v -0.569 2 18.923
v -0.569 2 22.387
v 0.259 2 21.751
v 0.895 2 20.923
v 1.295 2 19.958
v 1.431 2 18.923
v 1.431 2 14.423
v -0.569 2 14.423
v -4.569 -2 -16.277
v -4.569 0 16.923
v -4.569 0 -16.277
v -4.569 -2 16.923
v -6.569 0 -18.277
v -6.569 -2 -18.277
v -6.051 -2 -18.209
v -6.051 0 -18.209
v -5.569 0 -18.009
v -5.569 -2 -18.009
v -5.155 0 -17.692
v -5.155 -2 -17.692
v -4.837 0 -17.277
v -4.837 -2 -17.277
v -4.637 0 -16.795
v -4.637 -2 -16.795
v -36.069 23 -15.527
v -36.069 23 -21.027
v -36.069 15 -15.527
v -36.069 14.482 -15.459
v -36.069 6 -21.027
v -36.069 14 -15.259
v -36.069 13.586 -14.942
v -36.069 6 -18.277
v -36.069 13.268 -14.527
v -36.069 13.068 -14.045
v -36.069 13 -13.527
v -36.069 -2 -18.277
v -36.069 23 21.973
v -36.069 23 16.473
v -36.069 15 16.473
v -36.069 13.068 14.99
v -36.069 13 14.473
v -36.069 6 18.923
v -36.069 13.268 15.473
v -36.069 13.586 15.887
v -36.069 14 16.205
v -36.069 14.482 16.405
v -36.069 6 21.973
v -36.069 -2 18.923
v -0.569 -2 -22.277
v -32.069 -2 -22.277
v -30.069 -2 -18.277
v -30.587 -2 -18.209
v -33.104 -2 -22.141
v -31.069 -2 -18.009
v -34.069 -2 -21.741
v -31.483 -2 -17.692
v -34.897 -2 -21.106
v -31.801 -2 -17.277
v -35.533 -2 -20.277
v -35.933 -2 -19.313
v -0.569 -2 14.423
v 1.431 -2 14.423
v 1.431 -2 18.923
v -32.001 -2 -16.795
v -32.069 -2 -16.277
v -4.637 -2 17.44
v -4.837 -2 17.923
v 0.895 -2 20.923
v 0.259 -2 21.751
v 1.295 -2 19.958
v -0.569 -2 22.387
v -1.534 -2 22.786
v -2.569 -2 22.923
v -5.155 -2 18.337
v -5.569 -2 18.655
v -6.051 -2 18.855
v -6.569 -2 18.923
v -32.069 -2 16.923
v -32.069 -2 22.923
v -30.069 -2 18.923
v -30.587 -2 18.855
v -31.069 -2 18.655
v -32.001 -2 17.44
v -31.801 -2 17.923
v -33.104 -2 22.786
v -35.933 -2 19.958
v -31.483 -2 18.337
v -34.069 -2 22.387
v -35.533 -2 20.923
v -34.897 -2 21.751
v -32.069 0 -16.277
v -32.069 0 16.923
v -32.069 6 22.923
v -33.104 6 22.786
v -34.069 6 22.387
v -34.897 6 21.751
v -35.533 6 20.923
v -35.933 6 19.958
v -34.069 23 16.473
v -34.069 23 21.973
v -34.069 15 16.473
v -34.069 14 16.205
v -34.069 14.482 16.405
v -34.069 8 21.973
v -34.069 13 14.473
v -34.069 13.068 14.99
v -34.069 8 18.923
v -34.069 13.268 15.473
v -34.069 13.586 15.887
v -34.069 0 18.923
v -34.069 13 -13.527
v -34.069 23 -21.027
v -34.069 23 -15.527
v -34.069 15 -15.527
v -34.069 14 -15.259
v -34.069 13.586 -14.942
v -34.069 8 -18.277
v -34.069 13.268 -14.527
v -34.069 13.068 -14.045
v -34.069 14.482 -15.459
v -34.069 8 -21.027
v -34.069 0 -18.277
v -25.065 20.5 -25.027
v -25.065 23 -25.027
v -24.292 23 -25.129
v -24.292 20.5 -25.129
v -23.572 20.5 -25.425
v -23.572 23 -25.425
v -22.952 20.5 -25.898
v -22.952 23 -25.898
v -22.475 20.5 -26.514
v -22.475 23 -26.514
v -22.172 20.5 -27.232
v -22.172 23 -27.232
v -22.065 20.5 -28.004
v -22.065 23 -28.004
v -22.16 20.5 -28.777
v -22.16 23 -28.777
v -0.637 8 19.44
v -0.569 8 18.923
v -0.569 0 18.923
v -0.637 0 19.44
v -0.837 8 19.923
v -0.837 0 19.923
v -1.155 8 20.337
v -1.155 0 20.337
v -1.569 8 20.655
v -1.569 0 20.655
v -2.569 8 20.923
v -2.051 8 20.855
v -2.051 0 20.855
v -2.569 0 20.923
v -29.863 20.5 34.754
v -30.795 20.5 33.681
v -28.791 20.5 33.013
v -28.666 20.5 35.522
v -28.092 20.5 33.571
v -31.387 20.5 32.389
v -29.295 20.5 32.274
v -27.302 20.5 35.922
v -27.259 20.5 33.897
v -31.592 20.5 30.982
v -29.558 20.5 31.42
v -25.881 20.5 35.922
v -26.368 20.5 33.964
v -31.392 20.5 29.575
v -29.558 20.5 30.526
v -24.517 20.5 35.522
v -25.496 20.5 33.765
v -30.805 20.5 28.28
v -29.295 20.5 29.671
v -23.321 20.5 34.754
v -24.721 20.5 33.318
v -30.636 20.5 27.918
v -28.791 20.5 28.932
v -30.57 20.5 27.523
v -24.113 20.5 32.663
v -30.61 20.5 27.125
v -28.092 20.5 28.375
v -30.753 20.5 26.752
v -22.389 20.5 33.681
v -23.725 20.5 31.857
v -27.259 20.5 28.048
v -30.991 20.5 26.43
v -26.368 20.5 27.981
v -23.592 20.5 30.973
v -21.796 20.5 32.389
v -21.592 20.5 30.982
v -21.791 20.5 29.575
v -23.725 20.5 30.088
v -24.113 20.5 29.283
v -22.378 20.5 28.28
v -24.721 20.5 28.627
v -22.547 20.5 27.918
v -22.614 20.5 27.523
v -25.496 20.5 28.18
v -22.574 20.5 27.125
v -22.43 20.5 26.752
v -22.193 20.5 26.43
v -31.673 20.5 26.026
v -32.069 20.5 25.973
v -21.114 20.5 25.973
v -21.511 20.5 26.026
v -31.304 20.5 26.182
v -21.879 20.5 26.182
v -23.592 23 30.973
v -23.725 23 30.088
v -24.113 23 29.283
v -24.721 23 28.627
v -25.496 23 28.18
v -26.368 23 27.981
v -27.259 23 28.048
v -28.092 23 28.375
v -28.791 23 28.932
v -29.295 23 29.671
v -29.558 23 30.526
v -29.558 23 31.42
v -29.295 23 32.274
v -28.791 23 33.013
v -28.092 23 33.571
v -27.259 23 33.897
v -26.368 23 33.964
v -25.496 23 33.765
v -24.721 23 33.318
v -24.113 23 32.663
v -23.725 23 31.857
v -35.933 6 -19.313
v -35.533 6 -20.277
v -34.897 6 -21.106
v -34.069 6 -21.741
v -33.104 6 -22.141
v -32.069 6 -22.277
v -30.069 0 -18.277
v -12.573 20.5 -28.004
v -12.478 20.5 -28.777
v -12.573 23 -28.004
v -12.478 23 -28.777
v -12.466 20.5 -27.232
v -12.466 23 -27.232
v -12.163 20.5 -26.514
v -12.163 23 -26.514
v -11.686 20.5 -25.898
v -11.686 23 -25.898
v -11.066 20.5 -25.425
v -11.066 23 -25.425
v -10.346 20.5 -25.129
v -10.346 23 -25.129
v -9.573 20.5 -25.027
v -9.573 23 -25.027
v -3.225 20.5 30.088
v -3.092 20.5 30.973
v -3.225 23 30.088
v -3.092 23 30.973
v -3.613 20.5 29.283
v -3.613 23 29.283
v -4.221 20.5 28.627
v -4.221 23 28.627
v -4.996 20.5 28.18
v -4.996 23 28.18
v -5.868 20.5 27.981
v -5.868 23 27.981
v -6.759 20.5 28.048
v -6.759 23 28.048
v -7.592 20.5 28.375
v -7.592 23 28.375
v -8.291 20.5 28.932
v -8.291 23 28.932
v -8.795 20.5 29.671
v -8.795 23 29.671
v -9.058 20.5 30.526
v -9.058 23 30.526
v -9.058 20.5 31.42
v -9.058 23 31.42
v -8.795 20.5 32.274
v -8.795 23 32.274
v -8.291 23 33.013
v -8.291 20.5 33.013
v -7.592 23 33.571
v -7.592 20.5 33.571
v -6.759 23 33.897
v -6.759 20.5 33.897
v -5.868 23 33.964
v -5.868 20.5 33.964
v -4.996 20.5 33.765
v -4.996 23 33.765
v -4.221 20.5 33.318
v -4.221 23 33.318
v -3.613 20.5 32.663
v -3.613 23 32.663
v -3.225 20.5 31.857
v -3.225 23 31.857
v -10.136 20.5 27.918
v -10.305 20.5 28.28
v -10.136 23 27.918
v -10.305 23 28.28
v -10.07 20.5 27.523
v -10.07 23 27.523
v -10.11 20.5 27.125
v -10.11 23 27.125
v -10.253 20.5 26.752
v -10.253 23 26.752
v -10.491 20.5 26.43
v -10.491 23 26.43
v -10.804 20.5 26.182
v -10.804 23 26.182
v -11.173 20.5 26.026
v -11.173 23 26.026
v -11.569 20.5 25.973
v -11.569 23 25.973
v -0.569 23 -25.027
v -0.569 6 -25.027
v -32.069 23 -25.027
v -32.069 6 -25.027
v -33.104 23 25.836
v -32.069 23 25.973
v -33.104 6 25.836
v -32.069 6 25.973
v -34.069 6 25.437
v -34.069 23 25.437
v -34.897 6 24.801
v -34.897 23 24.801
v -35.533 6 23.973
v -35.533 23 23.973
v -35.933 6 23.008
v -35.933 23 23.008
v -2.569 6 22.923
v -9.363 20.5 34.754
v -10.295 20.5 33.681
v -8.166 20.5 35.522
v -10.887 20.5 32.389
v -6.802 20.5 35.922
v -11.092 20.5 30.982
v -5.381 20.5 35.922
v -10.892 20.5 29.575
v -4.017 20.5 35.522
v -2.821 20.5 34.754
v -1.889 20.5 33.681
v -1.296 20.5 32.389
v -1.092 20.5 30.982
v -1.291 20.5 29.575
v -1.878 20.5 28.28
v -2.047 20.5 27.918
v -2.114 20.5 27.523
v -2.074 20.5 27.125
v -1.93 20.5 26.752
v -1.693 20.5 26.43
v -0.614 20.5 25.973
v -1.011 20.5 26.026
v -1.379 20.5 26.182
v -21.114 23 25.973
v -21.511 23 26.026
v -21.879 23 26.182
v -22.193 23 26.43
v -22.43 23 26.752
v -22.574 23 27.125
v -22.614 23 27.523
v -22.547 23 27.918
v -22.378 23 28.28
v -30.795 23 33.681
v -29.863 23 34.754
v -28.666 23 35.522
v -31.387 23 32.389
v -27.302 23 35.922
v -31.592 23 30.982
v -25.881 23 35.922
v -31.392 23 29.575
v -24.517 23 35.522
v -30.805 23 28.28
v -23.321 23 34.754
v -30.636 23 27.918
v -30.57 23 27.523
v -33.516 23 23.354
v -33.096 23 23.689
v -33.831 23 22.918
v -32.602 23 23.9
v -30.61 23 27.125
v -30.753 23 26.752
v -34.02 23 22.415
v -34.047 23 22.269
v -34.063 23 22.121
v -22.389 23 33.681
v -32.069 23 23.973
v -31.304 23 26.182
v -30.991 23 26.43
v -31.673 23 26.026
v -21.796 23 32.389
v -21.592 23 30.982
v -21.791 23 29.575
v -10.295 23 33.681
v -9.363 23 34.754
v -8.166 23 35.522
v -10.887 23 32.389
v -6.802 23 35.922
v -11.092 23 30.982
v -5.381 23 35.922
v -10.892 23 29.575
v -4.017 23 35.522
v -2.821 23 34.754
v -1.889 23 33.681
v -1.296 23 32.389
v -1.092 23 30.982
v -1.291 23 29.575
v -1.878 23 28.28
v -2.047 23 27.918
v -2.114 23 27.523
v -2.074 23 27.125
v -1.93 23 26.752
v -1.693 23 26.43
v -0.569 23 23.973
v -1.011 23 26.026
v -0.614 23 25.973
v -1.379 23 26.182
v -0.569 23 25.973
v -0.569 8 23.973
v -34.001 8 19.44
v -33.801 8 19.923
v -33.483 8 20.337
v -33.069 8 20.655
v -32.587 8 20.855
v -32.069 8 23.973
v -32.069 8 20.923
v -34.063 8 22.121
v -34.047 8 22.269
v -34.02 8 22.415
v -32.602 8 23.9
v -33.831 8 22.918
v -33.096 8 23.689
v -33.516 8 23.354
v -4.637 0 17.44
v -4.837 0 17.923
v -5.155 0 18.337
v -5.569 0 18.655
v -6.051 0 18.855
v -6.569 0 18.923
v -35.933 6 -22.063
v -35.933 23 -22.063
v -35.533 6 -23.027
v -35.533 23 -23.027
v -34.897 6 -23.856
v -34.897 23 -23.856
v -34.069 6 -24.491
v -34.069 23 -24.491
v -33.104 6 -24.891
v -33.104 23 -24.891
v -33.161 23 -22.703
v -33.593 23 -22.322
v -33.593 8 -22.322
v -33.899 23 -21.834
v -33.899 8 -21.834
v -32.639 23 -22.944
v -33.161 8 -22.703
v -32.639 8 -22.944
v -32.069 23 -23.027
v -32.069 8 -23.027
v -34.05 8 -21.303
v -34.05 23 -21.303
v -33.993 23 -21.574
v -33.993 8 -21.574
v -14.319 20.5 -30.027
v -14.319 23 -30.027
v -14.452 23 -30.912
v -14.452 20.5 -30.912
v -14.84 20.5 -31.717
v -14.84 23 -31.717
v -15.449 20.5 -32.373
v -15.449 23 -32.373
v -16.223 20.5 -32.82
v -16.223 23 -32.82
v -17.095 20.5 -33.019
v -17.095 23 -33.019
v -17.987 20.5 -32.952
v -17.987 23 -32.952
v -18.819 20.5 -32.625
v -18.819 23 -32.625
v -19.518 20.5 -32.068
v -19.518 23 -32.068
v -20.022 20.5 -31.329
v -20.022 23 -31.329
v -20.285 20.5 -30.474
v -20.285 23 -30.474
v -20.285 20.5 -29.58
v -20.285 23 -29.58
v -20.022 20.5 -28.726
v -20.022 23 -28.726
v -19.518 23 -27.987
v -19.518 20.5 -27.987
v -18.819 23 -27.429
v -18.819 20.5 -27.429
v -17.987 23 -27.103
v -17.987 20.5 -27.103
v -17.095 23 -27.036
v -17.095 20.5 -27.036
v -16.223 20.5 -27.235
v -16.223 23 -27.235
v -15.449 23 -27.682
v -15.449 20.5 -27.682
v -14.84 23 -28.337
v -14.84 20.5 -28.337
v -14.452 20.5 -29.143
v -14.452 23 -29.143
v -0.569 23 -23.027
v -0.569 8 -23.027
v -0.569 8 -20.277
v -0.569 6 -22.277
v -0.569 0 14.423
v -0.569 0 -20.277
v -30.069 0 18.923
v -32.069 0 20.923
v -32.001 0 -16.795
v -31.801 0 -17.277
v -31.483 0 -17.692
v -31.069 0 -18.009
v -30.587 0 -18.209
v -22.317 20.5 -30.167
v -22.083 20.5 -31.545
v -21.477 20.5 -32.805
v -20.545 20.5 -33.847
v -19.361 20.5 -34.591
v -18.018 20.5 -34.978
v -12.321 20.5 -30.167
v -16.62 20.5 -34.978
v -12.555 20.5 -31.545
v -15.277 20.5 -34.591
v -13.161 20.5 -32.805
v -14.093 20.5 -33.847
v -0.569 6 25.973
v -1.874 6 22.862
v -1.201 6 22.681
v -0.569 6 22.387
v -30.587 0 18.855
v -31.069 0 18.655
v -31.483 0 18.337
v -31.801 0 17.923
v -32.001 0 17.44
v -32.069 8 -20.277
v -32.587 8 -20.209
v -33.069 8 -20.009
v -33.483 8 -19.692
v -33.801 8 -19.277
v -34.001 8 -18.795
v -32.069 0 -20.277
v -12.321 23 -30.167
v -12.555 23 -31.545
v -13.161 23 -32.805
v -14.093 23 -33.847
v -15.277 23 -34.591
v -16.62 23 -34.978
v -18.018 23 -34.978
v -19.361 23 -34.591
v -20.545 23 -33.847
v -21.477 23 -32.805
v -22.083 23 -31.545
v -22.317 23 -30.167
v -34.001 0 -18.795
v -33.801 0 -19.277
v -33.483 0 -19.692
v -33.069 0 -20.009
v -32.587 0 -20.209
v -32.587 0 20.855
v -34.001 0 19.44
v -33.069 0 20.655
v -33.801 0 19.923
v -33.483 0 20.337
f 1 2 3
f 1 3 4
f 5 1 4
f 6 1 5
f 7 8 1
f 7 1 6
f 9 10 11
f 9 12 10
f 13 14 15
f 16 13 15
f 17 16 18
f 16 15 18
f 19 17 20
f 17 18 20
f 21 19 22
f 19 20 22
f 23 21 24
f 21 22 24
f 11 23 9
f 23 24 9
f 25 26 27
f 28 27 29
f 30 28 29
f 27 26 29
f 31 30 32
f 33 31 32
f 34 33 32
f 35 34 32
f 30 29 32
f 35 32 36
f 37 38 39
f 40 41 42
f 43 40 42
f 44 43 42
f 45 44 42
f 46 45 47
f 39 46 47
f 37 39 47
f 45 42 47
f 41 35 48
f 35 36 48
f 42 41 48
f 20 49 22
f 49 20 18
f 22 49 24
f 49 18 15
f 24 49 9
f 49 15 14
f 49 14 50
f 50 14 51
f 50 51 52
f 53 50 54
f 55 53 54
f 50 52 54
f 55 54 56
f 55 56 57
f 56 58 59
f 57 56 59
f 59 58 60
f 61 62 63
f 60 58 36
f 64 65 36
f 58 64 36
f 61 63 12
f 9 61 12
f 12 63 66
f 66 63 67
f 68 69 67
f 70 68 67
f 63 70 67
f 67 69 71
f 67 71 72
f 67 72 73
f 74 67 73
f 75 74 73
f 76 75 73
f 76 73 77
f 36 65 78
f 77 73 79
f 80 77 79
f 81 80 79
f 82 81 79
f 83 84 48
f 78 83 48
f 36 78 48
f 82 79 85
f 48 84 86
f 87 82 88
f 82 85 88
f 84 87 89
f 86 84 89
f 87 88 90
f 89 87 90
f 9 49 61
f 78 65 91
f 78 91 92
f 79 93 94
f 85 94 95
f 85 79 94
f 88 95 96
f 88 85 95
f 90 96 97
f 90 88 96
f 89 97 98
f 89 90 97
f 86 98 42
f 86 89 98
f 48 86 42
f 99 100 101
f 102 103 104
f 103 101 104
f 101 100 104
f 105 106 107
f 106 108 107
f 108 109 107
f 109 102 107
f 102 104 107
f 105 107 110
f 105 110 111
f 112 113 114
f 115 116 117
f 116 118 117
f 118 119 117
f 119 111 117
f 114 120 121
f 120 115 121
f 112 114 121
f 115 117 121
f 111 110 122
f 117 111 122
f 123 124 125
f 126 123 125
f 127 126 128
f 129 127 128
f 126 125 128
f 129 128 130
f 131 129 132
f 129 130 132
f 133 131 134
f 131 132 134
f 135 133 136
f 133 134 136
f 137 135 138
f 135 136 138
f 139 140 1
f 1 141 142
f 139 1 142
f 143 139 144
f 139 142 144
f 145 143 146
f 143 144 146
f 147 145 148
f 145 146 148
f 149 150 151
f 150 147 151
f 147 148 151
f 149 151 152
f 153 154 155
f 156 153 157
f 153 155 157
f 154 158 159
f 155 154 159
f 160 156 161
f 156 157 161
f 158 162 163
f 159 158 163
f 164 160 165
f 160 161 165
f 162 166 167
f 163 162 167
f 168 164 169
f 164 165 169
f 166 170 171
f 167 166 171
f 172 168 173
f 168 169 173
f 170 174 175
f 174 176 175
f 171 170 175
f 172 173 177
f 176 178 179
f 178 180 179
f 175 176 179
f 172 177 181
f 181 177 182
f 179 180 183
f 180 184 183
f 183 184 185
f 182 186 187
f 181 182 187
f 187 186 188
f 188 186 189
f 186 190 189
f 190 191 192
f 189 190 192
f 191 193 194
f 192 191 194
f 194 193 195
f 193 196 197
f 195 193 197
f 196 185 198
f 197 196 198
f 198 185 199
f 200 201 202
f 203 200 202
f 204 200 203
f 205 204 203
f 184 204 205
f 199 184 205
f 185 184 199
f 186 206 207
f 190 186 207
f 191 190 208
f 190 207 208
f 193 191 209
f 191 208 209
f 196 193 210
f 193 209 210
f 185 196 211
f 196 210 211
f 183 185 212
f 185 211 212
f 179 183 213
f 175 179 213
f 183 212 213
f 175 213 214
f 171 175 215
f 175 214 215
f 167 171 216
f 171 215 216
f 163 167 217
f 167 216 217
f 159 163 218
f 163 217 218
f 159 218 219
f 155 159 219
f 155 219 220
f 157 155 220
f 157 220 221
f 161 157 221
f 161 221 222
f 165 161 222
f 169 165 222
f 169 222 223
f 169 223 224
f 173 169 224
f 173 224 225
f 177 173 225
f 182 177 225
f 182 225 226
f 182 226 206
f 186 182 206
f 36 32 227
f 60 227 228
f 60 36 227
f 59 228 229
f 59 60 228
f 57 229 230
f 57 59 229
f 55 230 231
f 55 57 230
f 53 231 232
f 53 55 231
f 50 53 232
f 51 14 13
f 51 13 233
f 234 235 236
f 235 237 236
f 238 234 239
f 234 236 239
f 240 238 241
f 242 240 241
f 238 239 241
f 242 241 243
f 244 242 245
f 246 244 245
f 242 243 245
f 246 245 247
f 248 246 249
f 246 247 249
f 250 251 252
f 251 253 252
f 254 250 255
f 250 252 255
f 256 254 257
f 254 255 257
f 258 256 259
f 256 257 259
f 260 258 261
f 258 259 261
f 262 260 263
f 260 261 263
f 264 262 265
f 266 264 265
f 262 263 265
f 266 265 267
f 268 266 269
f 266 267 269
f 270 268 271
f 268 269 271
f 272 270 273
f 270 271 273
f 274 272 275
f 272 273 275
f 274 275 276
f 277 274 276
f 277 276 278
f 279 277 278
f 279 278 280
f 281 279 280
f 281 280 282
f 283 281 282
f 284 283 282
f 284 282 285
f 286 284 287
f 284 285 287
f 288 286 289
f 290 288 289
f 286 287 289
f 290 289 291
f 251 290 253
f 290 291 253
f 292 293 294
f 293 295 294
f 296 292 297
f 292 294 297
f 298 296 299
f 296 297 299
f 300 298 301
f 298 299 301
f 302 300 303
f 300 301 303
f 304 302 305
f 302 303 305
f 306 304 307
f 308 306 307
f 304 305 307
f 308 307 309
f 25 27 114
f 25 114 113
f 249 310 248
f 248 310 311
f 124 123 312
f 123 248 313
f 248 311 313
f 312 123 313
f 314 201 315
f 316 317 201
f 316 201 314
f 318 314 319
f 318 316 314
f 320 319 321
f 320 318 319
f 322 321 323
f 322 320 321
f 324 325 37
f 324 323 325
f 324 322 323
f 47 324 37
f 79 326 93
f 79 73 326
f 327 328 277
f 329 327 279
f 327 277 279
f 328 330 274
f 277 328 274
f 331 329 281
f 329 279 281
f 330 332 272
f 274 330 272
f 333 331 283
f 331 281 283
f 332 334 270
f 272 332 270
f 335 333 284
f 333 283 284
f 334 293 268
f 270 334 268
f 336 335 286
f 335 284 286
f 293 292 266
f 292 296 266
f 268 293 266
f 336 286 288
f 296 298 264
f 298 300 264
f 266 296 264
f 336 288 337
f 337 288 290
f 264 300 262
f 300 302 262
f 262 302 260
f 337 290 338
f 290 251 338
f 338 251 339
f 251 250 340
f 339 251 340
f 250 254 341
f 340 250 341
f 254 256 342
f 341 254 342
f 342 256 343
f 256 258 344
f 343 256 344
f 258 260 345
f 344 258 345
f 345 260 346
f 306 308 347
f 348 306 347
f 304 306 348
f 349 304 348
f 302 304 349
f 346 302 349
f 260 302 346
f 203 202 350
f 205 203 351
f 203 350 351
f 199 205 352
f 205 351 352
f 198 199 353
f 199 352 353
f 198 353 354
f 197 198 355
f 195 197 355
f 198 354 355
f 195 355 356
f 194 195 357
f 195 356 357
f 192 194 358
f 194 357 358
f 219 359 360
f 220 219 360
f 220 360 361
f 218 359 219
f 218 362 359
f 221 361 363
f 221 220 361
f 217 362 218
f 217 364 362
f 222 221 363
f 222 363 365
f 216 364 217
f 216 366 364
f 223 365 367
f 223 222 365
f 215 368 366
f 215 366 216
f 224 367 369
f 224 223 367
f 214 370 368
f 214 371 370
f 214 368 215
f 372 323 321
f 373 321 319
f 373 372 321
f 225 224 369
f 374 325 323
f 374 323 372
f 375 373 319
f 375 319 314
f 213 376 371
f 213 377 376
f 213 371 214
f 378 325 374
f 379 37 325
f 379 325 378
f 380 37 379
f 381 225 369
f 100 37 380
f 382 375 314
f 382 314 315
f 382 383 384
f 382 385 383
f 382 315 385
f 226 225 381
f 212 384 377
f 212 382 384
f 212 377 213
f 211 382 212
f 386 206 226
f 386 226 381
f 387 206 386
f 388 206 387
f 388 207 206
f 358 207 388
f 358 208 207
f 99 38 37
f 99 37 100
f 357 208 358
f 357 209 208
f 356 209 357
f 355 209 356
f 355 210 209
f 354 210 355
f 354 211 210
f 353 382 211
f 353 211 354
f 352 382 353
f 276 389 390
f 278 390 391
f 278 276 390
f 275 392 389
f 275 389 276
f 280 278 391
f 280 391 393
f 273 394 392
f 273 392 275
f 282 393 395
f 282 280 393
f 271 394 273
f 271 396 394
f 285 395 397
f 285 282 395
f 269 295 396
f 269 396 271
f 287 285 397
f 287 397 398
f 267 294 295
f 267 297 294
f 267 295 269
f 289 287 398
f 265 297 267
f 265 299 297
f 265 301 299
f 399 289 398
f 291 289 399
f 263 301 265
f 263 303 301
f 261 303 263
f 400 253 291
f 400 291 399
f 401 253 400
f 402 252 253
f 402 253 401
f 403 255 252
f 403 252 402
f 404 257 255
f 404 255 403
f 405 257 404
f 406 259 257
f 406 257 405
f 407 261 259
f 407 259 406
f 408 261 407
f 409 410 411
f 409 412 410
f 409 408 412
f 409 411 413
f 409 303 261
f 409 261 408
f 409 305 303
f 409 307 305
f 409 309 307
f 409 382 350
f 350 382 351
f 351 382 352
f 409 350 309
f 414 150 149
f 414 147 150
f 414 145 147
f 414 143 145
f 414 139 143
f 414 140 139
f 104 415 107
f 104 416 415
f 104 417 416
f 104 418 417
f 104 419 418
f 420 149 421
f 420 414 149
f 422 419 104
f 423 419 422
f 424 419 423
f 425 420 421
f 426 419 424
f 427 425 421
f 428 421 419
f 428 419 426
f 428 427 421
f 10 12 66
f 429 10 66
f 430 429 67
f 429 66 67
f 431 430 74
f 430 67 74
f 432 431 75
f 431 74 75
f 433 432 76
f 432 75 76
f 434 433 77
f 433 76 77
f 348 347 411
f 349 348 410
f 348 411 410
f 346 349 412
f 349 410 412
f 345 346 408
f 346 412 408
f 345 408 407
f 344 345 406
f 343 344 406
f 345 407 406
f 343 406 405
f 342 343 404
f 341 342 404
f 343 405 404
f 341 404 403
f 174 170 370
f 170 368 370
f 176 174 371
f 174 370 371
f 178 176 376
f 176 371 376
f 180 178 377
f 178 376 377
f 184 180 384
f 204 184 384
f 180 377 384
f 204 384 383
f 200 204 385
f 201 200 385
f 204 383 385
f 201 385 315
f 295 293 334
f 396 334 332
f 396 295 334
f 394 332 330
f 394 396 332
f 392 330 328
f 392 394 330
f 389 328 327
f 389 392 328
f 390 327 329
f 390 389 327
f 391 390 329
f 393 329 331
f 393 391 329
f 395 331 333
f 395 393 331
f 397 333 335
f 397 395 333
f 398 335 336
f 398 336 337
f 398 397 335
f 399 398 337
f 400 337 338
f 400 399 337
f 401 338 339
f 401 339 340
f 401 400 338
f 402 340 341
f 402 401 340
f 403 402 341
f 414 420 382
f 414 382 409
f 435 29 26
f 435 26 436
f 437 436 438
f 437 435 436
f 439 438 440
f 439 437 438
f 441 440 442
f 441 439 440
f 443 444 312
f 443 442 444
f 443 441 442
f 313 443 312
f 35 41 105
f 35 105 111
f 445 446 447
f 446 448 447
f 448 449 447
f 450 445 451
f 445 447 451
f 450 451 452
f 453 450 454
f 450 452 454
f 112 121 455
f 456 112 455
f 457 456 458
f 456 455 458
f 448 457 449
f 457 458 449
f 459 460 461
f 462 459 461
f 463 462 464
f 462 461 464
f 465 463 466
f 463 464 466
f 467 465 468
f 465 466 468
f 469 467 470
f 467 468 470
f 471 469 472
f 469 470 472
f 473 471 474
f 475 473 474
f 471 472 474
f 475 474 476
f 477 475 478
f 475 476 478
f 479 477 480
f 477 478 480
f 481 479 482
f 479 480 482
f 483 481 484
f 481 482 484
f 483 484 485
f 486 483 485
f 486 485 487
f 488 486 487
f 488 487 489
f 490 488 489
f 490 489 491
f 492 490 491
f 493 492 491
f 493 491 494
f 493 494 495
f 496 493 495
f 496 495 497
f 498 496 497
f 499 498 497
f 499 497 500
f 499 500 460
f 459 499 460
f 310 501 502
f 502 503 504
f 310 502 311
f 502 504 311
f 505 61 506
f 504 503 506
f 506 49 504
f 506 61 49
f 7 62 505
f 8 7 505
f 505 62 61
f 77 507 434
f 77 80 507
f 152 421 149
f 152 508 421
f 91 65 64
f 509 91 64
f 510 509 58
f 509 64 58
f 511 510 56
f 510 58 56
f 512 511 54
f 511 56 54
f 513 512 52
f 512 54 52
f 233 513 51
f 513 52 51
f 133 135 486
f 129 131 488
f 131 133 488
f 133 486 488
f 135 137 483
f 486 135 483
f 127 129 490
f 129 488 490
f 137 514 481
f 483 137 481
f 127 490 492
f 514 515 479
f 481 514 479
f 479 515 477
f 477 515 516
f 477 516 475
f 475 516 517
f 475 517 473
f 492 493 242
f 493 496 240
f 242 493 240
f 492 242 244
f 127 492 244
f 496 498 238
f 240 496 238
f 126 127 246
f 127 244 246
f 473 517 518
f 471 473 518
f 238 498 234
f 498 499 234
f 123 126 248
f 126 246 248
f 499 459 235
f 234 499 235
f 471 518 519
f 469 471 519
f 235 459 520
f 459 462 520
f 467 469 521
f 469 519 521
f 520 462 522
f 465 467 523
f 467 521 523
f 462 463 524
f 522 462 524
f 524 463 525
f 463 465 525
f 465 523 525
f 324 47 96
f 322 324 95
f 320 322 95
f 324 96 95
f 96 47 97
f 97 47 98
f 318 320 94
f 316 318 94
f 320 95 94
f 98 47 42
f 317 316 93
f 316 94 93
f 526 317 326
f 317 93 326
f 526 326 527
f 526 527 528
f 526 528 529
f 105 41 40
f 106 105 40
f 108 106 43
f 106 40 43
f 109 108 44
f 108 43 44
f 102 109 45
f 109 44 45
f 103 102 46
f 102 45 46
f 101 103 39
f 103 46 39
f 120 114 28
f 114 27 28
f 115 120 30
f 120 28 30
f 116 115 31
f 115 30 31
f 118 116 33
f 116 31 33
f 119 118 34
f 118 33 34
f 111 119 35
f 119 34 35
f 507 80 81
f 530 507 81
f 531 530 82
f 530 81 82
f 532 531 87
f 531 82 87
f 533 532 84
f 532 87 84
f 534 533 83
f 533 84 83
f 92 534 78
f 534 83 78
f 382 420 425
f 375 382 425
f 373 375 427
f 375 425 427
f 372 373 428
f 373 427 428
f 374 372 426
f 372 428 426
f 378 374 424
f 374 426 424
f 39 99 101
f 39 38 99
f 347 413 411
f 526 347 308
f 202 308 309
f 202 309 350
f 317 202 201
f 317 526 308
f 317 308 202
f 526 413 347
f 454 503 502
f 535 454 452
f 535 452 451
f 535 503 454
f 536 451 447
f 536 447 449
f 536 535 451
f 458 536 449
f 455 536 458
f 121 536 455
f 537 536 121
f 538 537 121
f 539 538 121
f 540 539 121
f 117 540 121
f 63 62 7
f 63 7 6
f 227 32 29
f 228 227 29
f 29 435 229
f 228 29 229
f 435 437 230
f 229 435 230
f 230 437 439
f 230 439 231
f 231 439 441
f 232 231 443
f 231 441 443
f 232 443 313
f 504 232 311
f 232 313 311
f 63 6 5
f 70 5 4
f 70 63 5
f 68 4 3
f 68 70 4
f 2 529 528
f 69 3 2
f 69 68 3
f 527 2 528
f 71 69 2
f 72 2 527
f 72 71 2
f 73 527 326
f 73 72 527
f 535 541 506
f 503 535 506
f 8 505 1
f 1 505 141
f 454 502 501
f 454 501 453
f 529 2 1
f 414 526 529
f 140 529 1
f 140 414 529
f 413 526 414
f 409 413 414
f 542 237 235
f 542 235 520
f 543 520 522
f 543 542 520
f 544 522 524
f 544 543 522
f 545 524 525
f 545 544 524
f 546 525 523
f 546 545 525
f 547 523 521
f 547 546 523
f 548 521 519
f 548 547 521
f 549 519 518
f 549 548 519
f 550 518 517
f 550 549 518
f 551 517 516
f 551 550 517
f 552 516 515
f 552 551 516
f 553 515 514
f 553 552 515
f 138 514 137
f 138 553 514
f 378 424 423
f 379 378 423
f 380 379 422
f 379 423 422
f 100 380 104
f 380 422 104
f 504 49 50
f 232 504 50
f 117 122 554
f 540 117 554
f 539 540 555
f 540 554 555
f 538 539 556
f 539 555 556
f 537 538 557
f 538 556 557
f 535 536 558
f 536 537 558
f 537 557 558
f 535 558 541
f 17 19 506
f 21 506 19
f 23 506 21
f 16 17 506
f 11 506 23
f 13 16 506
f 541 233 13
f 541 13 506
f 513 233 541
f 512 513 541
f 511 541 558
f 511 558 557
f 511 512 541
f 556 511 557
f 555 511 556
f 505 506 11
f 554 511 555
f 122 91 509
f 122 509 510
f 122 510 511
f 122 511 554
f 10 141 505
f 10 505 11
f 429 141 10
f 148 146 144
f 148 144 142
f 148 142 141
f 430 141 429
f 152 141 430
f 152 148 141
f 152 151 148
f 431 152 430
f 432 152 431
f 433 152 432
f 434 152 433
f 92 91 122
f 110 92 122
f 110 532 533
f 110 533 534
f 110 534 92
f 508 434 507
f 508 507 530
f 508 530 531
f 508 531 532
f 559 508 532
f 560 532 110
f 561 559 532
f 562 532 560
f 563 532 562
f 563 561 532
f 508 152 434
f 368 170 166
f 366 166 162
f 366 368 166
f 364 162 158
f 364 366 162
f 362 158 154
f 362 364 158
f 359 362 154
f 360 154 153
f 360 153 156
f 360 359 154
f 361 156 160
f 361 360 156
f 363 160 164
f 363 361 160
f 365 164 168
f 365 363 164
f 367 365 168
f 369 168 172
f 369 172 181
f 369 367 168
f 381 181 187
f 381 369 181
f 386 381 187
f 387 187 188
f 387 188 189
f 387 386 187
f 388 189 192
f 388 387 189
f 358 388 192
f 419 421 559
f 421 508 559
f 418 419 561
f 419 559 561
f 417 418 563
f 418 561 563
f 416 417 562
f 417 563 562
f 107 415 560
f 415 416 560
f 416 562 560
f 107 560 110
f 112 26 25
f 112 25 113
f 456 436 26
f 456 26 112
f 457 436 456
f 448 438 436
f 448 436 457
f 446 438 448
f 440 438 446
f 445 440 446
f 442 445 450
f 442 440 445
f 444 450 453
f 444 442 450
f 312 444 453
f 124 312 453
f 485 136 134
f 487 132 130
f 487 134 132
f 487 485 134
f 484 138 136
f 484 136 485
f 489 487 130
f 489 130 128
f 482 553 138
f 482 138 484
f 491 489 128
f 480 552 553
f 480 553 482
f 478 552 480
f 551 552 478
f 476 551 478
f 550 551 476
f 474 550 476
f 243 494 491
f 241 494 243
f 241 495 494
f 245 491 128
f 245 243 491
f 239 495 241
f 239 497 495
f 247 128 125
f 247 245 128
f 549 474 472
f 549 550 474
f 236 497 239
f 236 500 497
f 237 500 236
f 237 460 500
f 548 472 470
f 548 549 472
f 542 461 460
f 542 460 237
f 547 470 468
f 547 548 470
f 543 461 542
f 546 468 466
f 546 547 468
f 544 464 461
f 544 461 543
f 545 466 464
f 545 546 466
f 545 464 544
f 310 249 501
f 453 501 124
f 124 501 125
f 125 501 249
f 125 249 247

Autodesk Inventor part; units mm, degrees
ref_plane "YZ Plane" through (0, 0, 0) normal (1, 0, 0) x (0, 1, 0)
ref_plane "XZ Plane" through (0, 0, 0) normal (0, 1, 0) x (-1, 0, 0)
sketch "Sketch1" plane through (0, 0, 0) normal (0, 1, 0) x (-1, 0, 0)
  arc A0 (31.569, 13.7227) -> (30.069, 12.2227) centre (31.569, 12.2227) ccw
  line L0 (31.569, 13.7227) -> (34.069, 13.7227)
  line L1 (34.069, 13.7227) -> (34.069, 18.9227)
  line L2 (32.069, 20.9227) -> (2.569, 20.9227)
  line L3 (34.069, -13.2773) -> (31.569, -13.2773)
  arc A1 (30.069, -11.7773) -> (31.569, -13.2773) centre (31.569, -11.7773) ccw
  arc A2 (34.069, 18.9227) -> (32.069, 20.9227) centre (32.069, 18.9227) ccw
  arc A3 (34.0195, 22.4149) -> (32.069, 23.9727) centre (32.069, 21.9727) ccw
  line L4 (32.069, 23.9727) -> (-23.931, 23.9727)
  arc A4 (-23.931, 23.9727) -> (-25.931, 21.9727) centre (-23.931, 21.9727) ccw
  line L5 (-25.931, 21.9727) -> (-25.931, -21.0273)
  arc A5 (-25.931, -21.0273) -> (-23.931, -23.0273) centre (-23.931, -21.0273) ccw
  line L6 (-23.931, -23.0273) -> (32.069, -23.0273)
  arc A6 (32.069, -23.0273) -> (33.899, -21.8341) centre (32.069, -21.0273) ccw
  arc A7 (32.069, -20.2773) -> (34.069, -18.2773) centre (32.069, -18.2773) ccw
  line L7 (32.069, -20.2773) -> (0.569, -20.2773)
  line L8 (34.069, -13.2773) -> (34.069, 13.7227)
  line L9 (0.569, -22.2773) -> (0.569, 18.9227)
  line L10 (30.069, -11.7773) -> (30.069, 12.2227)
  line L11 (34.069, -18.2773) -> (34.069, -13.2773)
  line L12 (2.569, 22.9227) -> (32.069, 22.9227)
  line L13 (0.569, -22.2773) -> (32.069, -22.2773)
  arc A8 (32.069, -22.2773) -> (36.069, -18.2773) centre (32.069, -18.2773) ccw
  line L14 (36.069, -18.2773) -> (36.069, 18.9227)
  arc A9 (2.569, 20.9227) -> (0.569, 18.9227) centre (2.569, 18.9227) ccw
  line L15 (-1.431, 14.4227) -> (-1.431, 18.9227)
  arc A10 (2.569, 22.9227) -> (-1.431, 18.9227) centre (2.569, 18.9227) ccw
  arc A11 (36.069, 18.9227) -> (32.069, 22.9227) centre (32.069, 18.9227) ccw
  line L16 (-1.431, 14.4227) -> (0.569, 14.4227)
  point P0 (0.569, 20.9227)
  dimension "d8" = 2
  dimension "d9" = 2
  dimension "d66" = 2
  dimension "d67" = 2
  dimension "d68" = 4.5
  dimension "d69" = 4
extrude "Extrusion3" add sketch "Sketch1" against normal blind 2 contours L0 L8 L3 A1 L10 A0 | A0 L10 A1 L3 L11 A7 L7 L9 A9 L2 A2 L1 L0 | L1 A2 L2 A9 L9 L16 L15 A10 L12 A11 L14 A8 L13 L7 A7 L11 L8
ref_plane "Work Plane1" through (0, 8, 0) normal (0, 1, 0) x (1, 0, 0)
extrude "Extrusion4" add sketch "Sketch1" along normal blind 8 contours L1 A2 L2 A9 L9 L16 L15 A10 L12 A11 L14 A8 L13 L7 A7 L11 L8
sketch "Sketch2" plane through (0, 8, 0) normal (0, 1, 0) x (1, 0, 0)
  line L0 (23.931, 23.0273) -> (-32.069, 23.0273) projected
  arc A0 (-32.069, 23.0273) -> (-33.899, 21.8341) centre (-32.069, 21.0273) ccw projected
  line L1 (-32.069, -23.9727) -> (23.931, -23.9727) projected
  arc A1 (-34.0195, -22.4149) -> (-32.069, -23.9727) centre (-32.069, -21.9727) ccw projected
  arc A2 (-32.069, 23.0273) -> (-34.069, 21.0273) centre (-32.069, 21.0273) ccw
  arc A3 (-34.069, -21.9727) -> (-32.069, -23.9727) centre (-32.069, -21.9727) ccw
  line L2 (-34.069, 18.2773) -> (-34.069, 13.2773) projected
  line L3 (-34.069, 13.2773) -> (-34.069, -13.7227) projected
  line L4 (-34.069, -13.7227) -> (-34.069, -18.9227) projected
  line L5 (-34.069, -21.9727) -> (-34.069, 21.0273)
  arc A4 (-32.069, 25.0273) -> (-36.069, 21.0273) centre (-32.069, 21.0273) ccw
  line L6 (-0.569, 25.0273) -> (-32.069, 25.0273)
  line L7 (-0.569, -25.9727) -> (-32.069, -25.9727)
  line L8 (-0.569, -23.9727) -> (-0.569, -25.9727)
  line L9 (-0.569, 20.2773) -> (-0.569, 25.0273)
  line L10 (-0.569, 22.2773) -> (-0.569, 22.2773) projected
  line L11 (-32.069, 23.0273) -> (-0.569, 23.0273)
  line L12 (-32.069, -23.9727) -> (-0.569, -23.9727)
  line L13 (-32.069, -20.9227) -> (-2.569, -20.9227) projected
  line L14 (-0.569, -14.4227) -> (-0.569, 20.2773) projected
  line L15 (-0.569, 20.2773) -> (-32.069, 20.2773) projected
  arc A5 (-32.069, 20.2773) -> (-34.069, 18.2773) centre (-32.069, 18.2773) ccw projected
  line L16 (-34.069, 18.2773) -> (-34.069, -18.9227) projected
  arc A6 (-34.069, -18.9227) -> (-32.069, -20.9227) centre (-32.069, -18.9227) ccw projected
  line L17 (-32.069, 22.2773) -> (-0.569, 22.2773) projected
  line L18 (-0.569, 22.2773) -> (-0.569, 22.2773)
  arc A7 (-2.569, -20.9227) -> (-0.569, -18.9227) centre (-2.569, -18.9227) ccw projected
  line L19 (-0.569, -18.9227) -> (-0.569, -14.4227) projected
  line L20 (-0.569, -23.9727) -> (-0.569, -18.9227)
  line L21 (-36.069, 21.0273) -> (-36.069, -21.9727)
  arc A8 (-36.069, -21.9727) -> (-32.069, -25.9727) centre (-32.069, -21.9727) ccw
  point P0 (0, 0)
  point P1 (-32.069, 25.0273)
  dimension "d19" = 2
  dimension "d20" = 2
  dimension "d21" = 31.5
  dimension "d22" = 31.5
  dimension "d23" = 31.5
extrude "Extrusion7" add sketch "Sketch2" against normal blind 2 contours L9 L15 A5 L5 A2 A0 L0 | L0 A0 A2 L5 L2 L3 L4 A3 A1 L1 L8 L7 A8 L21 A4 L6 L9 | L20 L1 A1 A3 L5 A6 L13 A7
extrude "Extrusion8" add sketch "Sketch2" along normal blind 15 contours L0 A0 A2 L5 L2 L3 L4 A3 A1 L1 L8 L7 A8 L21 A4 L6 L9
sketch "Sketch5" plane through (0, 23, 0) normal (0, 1, 0) x (1, 0, 0)
  circle A0 centre (-17.319, 30.0273) radius 5
  circle A1 centre (-17.319, 30.0273) radius 3
  arc A2 (-12.4777, 28.7773) -> (-9.573, 25.0273) centre (-9.573, 28.0273) ccw
  arc A3 (-25.0649, 25.0273) -> (-22.1602, 28.7773) centre (-25.0649, 28.0273) ccw
  line L0 (-0.569, 23.0273) -> (-0.569, 25.0273) projected
  circle A4 centre (-6.0917, -30.9727) radius 5
  circle A5 centre (-6.0917, -30.9727) radius 3
  arc A6 (-10.305, -28.2804) -> (-11.569, -25.9727) centre (-11.569, -27.4727) ccw
  arc A7 (-0.6145, -25.9727) -> (-1.8785, -28.2804) centre (-0.6145, -27.4727) ccw
  circle A8 centre (-26.5917, -30.9727) radius 5
  circle A9 centre (-26.5917, -30.9727) radius 3
  arc A10 (-30.805, -28.2804) -> (-32.069, -25.9727) centre (-32.069, -27.4727) ccw
  arc A11 (-21.1145, -25.9727) -> (-22.3785, -28.2804) centre (-21.1145, -27.4727) ccw
  line L1 (-0.569, -25.9727) -> (-0.569, -23.9727) projected
  line L2 (-0.569, 25.0273) -> (-32.069, 25.0273) projected
  line L3 (-32.069, -25.9727) -> (-0.569, -25.9727) projected
  point P0 (0, 0)
  point P1 (1.0185, -24.3852)
  point P2 (-26.5917, -25.9727)
  point P3 (-6.0917, -25.9727)
  point P4 (-17.319, 25.0273)
  dimension "d34" = 10
  dimension "d35" = 6
  dimension "d38" = 3
  dimension "d39" = 3
  dimension "d40" = 10
  dimension "d41" = 6
  dimension "d42" = 3
  dimension "d43" = 3
  dimension "d44" = 10
  dimension "d45" = 6
  dimension "d46" = 3
  dimension "d47" = 3
  dimension "d49" = 20.5
extrude "Extrusion10" add sketch "Sketch5" against normal blind 2.5
sketch "Sketch6" plane through (0, -2, 0) normal (0, -1, 0) x (1, 0, 0)
  line L0 (-0.569, -22.2773) -> (-0.569, 14.4227) projected
  line L1 (-2.569, 22.9227) -> (-32.069, 22.9227) projected
  arc A0 (-32.069, 22.9227) -> (-36.069, 18.9227) centre (-32.069, 18.9227) ccw projected
  line L2 (-36.069, 18.9227) -> (-36.069, -18.2773) projected
  arc A1 (-36.069, -18.2773) -> (-32.069, -22.2773) centre (-32.069, -18.2773) ccw projected
  line L3 (-32.069, -22.2773) -> (-0.569, -22.2773) projected
  line L4 (-30.069, 18.9227) -> (-6.569, 18.9227)
  line L5 (-4.569, 16.9227) -> (-4.569, -16.2773)
  line L6 (-6.569, -18.2773) -> (-30.069, -18.2773)
  line L7 (-32.069, -16.2773) -> (-32.069, 16.9227)
  arc A2 (-6.569, -18.2773) -> (-4.569, -16.2773) centre (-6.569, -16.2773) ccw
  arc A3 (-32.069, -16.2773) -> (-30.069, -18.2773) centre (-30.069, -16.2773) ccw
  arc A4 (-30.069, 18.9227) -> (-32.069, 16.9227) centre (-30.069, 16.9227) ccw
  arc A5 (-4.569, 16.9227) -> (-6.569, 18.9227) centre (-6.569, 16.9227) ccw
  line L8 (-0.569, 14.4227) -> (1.431, 14.4227) projected
  line L9 (1.431, 14.4227) -> (1.431, 18.9227) projected
  arc A6 (1.431, 18.9227) -> (-2.569, 22.9227) centre (-2.569, 18.9227) ccw projected
  point P0 (0, 0)
  point P1 (-4.569, 18.9227)
  point P2 (-4.569, -18.2773)
  dimension "d52" = 4
  dimension "d53" = 37.2
  dimension "d54" = 27.5
  dimension "d55" = 4
  dimension "d56" = 2
extrude "Extrusion11" cut sketch "Sketch6" against normal blind 2 contours L4 A5 L5 A2 L6 A3 L7 A4
sketch "Sketch7" plane through (-36.069, -2, -18.2773) normal (-1, 0, 0) x (0, 0, 1)
  line L0 (2.75, 25) -> (34.75, 25)
  line L1 (34.75, 25) -> (34.75, 17)
  line L2 (32.75, 15) -> (4.75, 15)
  line L3 (2.75, 17) -> (2.75, 25)
  arc A0 (2.75, 17) -> (4.75, 15) centre (4.75, 17) ccw
  arc A1 (32.75, 15) -> (34.75, 17) centre (32.75, 17) ccw
  point P0 (18.2773, 2)
  point P1 (40.25, 25)
  point P2 (-2.75, 25)
  point P3 (34.75, 21)
  point P4 (40.25, 8)
  dimension "d59" = 2
  dimension "d61" = 32
  dimension "d62" = 43
extrude "Extrusion12" cut sketch "Sketch7" against normal blind 6
sketch "Sketch8" plane through (0, 8, 0) normal (0, 1, 0) x (1, 0, 0)
  line L0 (-0.569, -14.4227) -> (-0.569, -18.9227) projected
  line L1 (1.431, -14.4227) -> (-0.569, -14.4227) projected
  line L2 (1.431, -18.9227) -> (1.431, -14.4227) projected
  arc A0 (-0.569, -22.3868) -> (1.431, -18.9227) centre (-2.569, -18.9227) ccw projected
  line L3 (-0.569, -23.9727) -> (-0.569, -18.9227) projected
  point P0 (0, 0)
extrude "Extrusion13" cut sketch "Sketch8" against normal blind 6
properties part number "CO-1-01-motorControllersMount"
